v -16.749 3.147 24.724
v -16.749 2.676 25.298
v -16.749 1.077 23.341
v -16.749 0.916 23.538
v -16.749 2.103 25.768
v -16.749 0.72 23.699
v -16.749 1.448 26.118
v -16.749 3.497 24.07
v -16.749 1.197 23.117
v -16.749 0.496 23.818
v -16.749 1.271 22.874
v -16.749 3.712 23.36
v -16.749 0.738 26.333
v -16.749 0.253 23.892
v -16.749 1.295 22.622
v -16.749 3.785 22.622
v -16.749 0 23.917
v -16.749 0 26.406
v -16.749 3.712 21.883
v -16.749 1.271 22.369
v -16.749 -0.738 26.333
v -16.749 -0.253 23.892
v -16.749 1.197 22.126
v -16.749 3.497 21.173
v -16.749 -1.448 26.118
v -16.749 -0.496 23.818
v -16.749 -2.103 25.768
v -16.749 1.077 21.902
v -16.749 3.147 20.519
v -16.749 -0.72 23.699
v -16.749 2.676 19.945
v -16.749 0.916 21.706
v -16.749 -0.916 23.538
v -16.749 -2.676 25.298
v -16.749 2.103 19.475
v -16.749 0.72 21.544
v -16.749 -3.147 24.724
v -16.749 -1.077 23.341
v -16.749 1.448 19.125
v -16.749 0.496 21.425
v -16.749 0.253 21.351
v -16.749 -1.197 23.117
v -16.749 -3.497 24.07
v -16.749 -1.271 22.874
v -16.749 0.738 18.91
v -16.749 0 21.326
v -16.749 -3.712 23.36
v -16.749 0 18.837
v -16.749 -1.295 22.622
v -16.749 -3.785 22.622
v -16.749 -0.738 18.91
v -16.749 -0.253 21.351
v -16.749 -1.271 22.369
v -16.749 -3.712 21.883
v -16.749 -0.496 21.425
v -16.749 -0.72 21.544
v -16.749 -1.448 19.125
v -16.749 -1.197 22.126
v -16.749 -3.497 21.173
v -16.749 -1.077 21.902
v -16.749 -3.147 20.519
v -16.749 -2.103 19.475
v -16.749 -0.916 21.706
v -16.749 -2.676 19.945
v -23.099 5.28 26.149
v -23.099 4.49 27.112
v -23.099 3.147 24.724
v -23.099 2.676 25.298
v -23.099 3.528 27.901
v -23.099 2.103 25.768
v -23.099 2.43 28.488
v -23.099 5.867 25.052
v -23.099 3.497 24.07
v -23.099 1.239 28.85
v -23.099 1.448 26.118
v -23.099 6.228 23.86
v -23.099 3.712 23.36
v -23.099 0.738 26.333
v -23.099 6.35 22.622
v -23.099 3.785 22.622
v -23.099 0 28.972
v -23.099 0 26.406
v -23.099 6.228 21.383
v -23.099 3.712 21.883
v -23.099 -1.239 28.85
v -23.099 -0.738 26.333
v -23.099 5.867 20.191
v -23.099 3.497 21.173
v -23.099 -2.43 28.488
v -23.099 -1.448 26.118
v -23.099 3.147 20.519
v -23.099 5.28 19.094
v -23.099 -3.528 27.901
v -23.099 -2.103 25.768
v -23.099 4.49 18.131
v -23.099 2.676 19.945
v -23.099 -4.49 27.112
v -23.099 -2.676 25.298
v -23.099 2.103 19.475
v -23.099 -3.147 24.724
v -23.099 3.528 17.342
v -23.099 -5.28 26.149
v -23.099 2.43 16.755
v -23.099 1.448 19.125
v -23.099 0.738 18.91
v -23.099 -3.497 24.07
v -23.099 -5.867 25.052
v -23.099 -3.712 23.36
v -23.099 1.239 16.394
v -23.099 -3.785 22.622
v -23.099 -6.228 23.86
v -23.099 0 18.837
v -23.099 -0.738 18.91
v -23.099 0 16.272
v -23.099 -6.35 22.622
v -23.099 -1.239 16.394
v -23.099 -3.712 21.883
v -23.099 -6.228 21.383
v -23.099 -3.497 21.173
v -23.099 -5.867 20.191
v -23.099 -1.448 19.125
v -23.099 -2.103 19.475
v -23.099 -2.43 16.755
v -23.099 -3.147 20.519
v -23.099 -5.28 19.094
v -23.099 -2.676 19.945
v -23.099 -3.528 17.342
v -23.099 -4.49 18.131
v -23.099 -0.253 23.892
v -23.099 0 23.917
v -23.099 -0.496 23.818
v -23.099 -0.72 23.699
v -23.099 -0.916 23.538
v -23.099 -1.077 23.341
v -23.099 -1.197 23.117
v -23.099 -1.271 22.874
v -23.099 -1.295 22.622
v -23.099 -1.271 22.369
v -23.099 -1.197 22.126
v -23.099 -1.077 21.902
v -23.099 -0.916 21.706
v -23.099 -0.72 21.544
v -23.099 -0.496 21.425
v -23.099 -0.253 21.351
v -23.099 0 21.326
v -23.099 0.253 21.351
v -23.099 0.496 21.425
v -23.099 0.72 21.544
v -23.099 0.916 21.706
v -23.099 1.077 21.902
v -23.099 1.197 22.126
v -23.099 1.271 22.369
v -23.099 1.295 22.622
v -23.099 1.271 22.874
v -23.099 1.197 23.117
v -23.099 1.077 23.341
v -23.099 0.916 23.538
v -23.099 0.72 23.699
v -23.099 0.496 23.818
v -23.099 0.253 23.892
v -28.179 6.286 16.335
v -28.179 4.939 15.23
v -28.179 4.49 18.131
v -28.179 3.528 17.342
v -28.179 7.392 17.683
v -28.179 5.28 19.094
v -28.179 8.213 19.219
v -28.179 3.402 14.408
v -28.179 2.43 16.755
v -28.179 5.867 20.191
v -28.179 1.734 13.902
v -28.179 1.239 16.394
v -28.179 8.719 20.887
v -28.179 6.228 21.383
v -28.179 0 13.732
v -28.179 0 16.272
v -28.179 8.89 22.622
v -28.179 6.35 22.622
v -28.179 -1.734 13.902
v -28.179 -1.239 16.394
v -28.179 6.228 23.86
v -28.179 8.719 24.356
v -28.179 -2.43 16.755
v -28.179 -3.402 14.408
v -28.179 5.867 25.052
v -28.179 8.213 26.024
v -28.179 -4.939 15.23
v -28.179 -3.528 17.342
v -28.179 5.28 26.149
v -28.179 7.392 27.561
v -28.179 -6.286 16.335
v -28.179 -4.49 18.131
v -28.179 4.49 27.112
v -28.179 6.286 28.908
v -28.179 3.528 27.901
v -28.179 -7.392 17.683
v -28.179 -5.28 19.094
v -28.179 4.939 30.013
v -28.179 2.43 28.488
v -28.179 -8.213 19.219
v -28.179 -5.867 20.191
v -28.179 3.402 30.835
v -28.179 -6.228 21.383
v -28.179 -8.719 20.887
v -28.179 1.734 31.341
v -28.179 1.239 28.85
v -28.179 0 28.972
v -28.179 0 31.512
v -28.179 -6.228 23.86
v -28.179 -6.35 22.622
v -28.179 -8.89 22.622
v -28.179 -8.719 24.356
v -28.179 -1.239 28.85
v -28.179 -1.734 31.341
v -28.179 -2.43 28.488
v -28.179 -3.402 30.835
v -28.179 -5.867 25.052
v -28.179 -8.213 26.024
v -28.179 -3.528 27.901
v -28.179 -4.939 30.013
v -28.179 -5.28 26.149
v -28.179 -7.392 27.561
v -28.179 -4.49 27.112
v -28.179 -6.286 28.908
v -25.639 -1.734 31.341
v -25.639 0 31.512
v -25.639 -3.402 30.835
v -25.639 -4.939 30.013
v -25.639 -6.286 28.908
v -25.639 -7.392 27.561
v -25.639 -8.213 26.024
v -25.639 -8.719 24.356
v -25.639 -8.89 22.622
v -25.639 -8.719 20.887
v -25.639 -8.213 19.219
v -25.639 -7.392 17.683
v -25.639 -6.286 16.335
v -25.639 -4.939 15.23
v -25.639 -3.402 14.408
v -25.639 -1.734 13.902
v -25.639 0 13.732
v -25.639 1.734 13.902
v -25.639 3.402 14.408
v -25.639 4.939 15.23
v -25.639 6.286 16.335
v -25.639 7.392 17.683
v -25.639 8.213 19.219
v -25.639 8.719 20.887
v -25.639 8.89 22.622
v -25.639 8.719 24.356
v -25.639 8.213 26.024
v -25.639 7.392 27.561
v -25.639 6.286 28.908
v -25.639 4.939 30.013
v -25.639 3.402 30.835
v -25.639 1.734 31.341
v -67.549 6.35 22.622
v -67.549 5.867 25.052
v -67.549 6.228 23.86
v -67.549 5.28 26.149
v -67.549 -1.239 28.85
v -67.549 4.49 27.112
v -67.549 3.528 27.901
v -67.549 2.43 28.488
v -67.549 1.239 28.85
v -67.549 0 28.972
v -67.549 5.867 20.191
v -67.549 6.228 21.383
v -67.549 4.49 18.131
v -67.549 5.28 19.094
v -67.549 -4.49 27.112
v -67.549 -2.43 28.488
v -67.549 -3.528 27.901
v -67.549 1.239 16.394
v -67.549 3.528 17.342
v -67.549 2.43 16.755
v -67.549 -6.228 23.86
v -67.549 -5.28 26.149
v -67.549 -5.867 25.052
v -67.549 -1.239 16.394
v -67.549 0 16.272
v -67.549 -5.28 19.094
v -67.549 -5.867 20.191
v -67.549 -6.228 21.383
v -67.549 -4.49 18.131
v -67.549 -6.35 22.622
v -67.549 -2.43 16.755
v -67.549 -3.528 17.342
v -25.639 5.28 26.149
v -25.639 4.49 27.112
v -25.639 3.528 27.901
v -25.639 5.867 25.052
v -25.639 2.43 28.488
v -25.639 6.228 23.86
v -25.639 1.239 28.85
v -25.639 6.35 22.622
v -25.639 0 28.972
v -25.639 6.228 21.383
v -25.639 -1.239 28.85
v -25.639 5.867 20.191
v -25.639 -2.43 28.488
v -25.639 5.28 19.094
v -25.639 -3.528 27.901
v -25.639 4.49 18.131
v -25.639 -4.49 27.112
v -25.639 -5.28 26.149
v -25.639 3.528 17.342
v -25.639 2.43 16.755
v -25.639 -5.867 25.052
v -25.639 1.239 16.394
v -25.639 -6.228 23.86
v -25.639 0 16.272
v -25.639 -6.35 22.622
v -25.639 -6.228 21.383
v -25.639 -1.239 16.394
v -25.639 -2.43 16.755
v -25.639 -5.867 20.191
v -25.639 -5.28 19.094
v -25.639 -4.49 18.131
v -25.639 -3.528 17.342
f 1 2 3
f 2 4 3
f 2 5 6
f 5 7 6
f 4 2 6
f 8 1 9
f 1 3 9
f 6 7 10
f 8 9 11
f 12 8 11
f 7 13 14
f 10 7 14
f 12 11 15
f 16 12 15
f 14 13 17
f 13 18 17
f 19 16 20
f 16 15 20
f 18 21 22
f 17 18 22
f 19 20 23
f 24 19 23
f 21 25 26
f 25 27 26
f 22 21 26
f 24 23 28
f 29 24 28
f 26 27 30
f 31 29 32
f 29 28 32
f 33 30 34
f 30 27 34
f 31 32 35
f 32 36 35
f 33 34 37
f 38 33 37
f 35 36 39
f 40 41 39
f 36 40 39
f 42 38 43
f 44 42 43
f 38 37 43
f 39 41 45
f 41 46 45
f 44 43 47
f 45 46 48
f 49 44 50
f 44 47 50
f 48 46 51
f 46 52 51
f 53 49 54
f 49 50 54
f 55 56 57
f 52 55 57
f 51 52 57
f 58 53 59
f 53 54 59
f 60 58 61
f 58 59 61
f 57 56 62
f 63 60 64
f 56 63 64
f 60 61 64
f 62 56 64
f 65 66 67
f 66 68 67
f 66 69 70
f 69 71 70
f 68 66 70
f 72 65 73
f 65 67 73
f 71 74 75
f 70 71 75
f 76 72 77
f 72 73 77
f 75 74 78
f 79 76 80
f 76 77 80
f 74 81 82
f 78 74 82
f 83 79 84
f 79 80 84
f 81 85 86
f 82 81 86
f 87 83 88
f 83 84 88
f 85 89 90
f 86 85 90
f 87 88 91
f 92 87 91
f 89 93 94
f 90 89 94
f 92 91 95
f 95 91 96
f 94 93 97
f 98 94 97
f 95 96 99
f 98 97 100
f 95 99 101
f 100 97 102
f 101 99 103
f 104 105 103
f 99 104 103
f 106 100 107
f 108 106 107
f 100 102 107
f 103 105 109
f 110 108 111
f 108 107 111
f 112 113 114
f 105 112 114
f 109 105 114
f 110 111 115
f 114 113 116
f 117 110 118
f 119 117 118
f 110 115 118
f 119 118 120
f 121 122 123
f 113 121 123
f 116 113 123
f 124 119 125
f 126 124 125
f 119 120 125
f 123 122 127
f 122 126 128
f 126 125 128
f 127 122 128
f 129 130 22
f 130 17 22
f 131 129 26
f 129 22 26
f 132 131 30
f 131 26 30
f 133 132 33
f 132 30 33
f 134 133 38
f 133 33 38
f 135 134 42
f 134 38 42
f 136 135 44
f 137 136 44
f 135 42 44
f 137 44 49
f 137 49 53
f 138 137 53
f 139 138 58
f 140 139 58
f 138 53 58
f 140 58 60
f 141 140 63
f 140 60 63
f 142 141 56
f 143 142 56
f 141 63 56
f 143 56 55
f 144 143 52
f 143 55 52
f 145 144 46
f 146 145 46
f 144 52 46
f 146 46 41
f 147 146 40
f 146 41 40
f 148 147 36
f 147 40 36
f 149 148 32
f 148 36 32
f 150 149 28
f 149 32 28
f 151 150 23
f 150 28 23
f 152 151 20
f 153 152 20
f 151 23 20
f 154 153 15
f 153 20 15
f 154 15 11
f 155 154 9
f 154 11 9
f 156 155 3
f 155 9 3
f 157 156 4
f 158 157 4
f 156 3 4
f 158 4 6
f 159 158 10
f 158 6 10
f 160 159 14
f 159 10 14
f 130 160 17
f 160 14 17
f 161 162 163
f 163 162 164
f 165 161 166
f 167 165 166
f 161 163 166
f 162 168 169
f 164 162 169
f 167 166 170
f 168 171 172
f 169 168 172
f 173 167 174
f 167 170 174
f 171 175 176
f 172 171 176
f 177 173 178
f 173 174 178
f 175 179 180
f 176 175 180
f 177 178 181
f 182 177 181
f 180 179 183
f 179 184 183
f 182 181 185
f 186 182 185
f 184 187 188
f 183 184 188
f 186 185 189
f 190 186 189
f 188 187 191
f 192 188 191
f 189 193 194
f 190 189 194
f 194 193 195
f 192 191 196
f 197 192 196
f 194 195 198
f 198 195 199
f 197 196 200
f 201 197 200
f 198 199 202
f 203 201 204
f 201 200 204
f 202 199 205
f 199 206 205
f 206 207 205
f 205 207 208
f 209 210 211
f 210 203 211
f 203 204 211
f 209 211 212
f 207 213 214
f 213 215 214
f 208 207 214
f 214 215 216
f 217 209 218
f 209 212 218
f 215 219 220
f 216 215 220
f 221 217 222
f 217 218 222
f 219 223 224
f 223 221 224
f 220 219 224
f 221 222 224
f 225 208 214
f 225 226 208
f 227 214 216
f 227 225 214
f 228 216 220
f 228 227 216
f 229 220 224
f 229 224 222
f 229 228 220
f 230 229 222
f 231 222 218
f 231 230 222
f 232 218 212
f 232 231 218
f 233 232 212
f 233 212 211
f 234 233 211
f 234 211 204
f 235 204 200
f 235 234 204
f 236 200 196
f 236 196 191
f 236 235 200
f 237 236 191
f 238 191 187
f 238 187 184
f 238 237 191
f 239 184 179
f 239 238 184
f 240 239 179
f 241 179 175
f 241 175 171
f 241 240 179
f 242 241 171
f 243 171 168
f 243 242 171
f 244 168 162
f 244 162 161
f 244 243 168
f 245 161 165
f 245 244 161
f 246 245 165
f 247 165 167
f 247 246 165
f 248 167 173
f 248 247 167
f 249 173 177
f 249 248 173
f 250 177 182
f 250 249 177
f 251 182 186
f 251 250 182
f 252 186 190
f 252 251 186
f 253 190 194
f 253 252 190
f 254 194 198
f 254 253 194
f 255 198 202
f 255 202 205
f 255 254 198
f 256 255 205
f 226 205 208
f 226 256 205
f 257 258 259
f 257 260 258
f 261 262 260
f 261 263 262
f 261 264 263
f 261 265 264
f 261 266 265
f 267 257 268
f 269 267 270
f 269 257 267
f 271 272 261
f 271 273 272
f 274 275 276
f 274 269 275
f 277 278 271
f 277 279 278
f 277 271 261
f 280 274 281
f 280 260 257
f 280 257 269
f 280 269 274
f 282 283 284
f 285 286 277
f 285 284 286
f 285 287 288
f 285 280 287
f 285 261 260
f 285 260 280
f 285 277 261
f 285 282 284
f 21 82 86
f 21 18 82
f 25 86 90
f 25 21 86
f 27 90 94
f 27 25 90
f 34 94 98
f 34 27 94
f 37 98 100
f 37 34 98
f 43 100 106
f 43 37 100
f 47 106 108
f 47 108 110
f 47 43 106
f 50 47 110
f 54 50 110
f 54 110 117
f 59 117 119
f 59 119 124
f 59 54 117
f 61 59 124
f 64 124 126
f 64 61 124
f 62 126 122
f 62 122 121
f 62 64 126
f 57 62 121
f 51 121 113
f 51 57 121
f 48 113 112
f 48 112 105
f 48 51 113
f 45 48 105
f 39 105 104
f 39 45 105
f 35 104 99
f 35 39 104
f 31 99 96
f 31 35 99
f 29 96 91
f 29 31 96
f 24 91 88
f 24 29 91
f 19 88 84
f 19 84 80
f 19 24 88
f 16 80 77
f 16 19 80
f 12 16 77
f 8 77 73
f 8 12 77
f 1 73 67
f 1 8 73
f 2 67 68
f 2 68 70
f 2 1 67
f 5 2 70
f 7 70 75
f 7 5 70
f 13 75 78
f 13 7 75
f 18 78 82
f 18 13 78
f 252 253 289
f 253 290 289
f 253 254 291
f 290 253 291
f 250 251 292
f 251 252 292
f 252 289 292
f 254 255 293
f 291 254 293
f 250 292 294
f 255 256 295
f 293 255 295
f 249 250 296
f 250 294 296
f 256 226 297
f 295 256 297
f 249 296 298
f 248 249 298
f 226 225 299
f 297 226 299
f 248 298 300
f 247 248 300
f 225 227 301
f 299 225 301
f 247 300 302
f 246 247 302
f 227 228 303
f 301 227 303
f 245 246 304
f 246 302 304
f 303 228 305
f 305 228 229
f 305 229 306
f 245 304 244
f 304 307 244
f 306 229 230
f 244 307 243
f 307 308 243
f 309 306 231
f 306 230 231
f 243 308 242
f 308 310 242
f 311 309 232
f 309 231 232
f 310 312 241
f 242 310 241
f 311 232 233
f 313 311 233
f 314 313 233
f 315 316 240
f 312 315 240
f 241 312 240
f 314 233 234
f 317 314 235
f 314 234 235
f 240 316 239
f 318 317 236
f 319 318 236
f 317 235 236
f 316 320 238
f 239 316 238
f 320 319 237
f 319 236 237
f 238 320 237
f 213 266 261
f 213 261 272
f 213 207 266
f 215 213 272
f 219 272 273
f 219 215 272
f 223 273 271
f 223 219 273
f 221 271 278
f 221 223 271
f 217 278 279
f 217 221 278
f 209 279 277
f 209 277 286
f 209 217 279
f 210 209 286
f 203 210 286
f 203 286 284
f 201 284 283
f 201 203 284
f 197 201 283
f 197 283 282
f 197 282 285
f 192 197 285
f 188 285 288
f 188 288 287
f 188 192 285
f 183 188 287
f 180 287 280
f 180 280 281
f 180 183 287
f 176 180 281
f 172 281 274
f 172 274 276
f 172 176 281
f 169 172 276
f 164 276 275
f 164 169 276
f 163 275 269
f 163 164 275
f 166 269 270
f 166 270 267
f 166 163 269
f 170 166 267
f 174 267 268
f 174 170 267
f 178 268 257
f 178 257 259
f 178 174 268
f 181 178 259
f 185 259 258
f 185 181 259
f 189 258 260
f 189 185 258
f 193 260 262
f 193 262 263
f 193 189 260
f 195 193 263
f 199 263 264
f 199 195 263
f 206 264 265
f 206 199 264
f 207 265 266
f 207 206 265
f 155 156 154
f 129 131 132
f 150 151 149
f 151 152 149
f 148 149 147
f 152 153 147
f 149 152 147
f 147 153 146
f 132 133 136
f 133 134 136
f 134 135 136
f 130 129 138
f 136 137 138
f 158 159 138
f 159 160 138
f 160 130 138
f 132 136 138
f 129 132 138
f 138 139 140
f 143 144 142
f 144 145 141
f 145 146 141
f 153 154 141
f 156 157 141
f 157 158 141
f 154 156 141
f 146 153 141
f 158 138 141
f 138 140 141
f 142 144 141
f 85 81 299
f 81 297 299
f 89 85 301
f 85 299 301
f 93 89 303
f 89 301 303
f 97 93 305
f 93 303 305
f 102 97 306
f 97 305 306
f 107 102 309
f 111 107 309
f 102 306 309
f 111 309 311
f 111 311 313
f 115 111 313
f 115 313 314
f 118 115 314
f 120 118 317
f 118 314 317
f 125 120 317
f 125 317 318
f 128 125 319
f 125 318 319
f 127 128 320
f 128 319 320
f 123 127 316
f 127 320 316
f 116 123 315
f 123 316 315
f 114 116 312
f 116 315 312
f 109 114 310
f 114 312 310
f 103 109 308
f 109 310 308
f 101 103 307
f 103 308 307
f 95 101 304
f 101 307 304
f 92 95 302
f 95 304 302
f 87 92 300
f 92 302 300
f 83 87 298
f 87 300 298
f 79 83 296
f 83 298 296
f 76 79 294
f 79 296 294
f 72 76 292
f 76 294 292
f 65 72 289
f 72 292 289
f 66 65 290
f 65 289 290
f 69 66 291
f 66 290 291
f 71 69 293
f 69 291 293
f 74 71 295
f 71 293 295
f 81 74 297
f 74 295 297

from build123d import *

# Parameters (mm, degrees)
F0_W   = 2.54
F0_H   = 6.35
F0_H_2 = 2.54
F0_W_2 = 39.37
F0_W_3 = 6.35
F0_H_3 = 2.4892


# Not quite as in the source:
# - a feature names something its author has since deleted; it is built from what else it names


with BuildPart() as f1:
    # F0 (on Front) → F1 (revolve)
    with BuildSketch(Plane.XZ):
        Polygon((-23.0985377062, 28.9715196595), (-25.6385377062, 28.9715196595), (-25.6385377062, 22.6215196595), (-23.0985377062, 22.6215196595), (-23.0985377062, 23.9169196595), (-23.0985377062, 26.4061196595), align=None)
        with Locations((-26.9085377062, 25.7965196595)):
            Rectangle(F0_W, F0_H)
        with Locations((-26.9085377062, 30.2415196595)):
            Rectangle(F0_W, F0_H_2)
        with Locations((-47.8635377062, 25.7965196595)):
            Rectangle(F0_W_2, F0_H)
        with Locations((-19.9235377062, 25.1615196595)):
            Rectangle(F0_W_3, F0_H_3)
    revolve(axis=Axis((-42.1485377062, 0, 22.6215196595), (1, 0, 0)))


solid = f1.part
